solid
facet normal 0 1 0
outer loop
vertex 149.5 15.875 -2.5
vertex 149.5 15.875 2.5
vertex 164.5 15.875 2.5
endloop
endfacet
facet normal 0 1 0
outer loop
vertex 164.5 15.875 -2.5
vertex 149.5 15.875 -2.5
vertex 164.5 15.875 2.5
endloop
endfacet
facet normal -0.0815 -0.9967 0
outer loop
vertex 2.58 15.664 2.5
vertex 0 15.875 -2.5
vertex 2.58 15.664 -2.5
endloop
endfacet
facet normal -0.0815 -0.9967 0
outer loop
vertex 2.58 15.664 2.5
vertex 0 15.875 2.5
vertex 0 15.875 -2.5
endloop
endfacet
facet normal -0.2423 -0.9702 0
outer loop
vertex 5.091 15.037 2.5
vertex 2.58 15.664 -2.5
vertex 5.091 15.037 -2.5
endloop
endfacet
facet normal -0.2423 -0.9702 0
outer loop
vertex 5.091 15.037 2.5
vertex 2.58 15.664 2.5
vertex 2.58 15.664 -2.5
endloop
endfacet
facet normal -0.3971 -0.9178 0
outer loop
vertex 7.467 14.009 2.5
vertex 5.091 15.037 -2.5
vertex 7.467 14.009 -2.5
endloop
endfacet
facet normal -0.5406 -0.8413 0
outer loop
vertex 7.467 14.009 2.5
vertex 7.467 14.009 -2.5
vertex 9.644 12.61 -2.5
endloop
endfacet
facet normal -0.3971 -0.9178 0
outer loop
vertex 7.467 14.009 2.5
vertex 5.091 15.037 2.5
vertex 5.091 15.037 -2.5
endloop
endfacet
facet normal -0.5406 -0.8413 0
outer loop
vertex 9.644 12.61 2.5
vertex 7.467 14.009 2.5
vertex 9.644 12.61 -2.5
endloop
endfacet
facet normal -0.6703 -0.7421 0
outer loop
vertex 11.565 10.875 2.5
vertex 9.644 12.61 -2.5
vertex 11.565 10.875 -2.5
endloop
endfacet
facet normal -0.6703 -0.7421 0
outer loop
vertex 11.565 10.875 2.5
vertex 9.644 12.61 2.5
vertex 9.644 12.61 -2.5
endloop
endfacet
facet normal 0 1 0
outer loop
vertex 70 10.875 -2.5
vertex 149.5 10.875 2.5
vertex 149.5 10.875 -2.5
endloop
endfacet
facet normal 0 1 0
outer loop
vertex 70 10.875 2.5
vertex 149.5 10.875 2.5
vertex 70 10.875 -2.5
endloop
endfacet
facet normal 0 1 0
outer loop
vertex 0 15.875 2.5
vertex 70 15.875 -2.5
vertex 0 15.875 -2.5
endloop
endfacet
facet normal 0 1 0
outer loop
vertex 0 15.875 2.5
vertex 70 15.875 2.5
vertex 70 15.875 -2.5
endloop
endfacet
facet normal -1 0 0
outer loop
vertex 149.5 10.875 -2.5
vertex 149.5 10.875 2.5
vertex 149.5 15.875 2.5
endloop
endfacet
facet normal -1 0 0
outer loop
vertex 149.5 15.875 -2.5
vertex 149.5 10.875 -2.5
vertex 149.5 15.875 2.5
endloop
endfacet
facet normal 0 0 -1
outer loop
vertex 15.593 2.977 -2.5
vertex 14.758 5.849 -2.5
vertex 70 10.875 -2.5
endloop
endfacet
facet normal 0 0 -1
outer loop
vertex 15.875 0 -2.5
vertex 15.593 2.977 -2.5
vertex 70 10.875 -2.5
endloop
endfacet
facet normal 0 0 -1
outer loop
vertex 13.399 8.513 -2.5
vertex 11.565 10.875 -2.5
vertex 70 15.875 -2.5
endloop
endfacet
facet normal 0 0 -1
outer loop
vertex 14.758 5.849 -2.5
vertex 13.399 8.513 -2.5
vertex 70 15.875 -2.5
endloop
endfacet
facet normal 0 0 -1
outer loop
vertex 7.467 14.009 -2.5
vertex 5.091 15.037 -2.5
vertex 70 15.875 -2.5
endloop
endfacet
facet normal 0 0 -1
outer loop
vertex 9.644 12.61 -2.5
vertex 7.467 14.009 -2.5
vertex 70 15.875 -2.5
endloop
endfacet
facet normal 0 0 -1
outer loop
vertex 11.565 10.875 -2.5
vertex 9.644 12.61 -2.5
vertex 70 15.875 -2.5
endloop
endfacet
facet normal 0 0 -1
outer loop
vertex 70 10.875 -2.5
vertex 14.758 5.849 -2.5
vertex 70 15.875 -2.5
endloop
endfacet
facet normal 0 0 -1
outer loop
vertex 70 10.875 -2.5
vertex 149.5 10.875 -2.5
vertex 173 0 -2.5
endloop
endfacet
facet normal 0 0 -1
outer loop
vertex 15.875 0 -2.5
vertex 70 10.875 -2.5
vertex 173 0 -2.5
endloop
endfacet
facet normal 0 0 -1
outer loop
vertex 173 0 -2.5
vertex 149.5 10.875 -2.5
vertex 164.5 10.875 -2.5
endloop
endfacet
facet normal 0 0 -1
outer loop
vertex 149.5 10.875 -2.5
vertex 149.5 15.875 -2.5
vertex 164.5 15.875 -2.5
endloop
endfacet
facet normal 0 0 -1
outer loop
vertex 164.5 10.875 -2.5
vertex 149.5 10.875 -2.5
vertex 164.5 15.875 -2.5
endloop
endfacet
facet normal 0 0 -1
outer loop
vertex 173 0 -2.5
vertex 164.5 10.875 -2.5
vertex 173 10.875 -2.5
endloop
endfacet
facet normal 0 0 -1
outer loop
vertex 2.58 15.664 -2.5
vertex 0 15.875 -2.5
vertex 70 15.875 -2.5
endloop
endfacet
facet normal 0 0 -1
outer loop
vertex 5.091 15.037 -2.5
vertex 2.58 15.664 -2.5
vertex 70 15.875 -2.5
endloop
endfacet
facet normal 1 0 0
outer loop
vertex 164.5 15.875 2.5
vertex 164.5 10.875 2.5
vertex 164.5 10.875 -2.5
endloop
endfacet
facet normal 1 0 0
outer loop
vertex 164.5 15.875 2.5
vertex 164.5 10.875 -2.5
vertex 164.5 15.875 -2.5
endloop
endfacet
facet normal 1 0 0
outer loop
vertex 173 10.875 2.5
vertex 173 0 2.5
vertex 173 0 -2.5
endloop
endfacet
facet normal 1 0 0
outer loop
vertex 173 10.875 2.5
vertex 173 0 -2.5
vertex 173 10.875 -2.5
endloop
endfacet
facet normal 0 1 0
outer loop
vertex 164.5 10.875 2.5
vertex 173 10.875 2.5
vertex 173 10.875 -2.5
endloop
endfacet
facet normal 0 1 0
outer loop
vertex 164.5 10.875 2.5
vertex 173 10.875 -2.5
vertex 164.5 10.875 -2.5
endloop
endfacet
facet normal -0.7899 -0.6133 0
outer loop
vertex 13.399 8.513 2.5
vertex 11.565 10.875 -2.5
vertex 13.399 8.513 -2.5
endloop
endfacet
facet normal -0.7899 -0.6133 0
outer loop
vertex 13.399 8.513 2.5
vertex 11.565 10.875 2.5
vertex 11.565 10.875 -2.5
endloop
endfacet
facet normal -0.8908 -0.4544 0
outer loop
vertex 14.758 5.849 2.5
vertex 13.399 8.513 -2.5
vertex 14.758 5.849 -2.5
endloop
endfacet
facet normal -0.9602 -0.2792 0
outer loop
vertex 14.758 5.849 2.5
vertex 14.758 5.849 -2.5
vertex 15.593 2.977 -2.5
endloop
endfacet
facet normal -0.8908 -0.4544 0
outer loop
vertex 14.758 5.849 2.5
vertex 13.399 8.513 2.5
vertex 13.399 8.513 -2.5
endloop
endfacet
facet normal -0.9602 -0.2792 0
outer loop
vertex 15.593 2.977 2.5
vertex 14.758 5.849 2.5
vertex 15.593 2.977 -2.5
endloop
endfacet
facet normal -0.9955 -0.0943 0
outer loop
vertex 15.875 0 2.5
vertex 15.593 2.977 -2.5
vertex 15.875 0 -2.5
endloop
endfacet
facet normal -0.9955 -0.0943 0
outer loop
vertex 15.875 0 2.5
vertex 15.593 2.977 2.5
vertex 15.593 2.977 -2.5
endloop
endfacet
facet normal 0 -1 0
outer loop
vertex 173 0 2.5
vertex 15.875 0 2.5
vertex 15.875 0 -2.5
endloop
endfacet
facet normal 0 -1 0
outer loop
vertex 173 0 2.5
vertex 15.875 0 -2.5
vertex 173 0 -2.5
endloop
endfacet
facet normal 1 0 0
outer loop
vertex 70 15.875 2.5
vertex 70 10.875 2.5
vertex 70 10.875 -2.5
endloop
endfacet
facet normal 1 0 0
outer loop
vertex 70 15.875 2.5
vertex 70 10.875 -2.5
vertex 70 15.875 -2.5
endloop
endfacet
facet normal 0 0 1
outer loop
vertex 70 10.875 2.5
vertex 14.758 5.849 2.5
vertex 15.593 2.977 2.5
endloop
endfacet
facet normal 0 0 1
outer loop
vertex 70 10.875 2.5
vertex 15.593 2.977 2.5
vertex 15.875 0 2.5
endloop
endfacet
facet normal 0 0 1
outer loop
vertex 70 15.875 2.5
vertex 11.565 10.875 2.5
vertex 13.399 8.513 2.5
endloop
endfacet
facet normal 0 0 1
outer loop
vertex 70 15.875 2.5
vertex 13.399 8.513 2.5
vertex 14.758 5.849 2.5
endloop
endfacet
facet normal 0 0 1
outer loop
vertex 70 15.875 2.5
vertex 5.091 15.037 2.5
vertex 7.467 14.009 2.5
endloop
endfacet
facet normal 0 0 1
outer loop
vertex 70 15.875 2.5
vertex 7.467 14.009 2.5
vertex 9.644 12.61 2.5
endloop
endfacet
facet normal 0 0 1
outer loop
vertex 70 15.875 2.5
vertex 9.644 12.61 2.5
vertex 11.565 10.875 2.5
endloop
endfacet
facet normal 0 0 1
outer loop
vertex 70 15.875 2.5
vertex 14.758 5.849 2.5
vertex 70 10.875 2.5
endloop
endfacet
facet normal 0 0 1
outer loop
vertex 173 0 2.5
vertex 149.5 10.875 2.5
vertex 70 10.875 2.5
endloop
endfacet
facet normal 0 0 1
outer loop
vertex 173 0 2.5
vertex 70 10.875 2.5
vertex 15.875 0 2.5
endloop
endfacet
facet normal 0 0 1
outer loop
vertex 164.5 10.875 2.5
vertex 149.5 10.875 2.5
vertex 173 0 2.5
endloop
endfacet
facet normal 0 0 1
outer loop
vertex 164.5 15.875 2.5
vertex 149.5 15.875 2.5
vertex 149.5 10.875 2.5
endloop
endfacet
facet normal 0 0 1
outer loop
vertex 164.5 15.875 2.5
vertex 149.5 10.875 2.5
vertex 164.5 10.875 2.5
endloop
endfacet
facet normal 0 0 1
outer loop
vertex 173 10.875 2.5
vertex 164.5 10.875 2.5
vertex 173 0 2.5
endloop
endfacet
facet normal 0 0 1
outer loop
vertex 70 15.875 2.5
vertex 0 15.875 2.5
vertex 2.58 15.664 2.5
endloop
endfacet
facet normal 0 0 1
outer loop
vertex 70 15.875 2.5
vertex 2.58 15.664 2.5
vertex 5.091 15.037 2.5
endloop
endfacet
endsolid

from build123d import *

# Parameters (mm, degrees)
BOSS_EXTRUDE1_DEPTH = 2.5


with BuildPart() as part:
    # Sketch1 → Boss-Extrude1 (new, symmetric)
    with BuildSketch(Plane.XY):
        with BuildLine():
            ThreePointArc((0, 15.875), (11.225320151, 11.225320151), (15.875, 0))
            Line((15.875, 0), (173, 0))
            Line((173, 0), (173, 10.875))
            Line((173, 10.875), (164.5, 10.875))
            Line((164.5, 10.875), (164.5, 15.875))
            Line((164.5, 15.875), (149.5, 15.875))
            Line((149.5, 15.875), (149.5, 10.875))
            Line((149.5, 10.875), (70, 10.875))
            Line((70, 10.875), (70, 15.875))
            Line((70, 15.875), (0, 15.875))
        make_face()
    extrude(amount=BOSS_EXTRUDE1_DEPTH, both=True)


solid = part.part
